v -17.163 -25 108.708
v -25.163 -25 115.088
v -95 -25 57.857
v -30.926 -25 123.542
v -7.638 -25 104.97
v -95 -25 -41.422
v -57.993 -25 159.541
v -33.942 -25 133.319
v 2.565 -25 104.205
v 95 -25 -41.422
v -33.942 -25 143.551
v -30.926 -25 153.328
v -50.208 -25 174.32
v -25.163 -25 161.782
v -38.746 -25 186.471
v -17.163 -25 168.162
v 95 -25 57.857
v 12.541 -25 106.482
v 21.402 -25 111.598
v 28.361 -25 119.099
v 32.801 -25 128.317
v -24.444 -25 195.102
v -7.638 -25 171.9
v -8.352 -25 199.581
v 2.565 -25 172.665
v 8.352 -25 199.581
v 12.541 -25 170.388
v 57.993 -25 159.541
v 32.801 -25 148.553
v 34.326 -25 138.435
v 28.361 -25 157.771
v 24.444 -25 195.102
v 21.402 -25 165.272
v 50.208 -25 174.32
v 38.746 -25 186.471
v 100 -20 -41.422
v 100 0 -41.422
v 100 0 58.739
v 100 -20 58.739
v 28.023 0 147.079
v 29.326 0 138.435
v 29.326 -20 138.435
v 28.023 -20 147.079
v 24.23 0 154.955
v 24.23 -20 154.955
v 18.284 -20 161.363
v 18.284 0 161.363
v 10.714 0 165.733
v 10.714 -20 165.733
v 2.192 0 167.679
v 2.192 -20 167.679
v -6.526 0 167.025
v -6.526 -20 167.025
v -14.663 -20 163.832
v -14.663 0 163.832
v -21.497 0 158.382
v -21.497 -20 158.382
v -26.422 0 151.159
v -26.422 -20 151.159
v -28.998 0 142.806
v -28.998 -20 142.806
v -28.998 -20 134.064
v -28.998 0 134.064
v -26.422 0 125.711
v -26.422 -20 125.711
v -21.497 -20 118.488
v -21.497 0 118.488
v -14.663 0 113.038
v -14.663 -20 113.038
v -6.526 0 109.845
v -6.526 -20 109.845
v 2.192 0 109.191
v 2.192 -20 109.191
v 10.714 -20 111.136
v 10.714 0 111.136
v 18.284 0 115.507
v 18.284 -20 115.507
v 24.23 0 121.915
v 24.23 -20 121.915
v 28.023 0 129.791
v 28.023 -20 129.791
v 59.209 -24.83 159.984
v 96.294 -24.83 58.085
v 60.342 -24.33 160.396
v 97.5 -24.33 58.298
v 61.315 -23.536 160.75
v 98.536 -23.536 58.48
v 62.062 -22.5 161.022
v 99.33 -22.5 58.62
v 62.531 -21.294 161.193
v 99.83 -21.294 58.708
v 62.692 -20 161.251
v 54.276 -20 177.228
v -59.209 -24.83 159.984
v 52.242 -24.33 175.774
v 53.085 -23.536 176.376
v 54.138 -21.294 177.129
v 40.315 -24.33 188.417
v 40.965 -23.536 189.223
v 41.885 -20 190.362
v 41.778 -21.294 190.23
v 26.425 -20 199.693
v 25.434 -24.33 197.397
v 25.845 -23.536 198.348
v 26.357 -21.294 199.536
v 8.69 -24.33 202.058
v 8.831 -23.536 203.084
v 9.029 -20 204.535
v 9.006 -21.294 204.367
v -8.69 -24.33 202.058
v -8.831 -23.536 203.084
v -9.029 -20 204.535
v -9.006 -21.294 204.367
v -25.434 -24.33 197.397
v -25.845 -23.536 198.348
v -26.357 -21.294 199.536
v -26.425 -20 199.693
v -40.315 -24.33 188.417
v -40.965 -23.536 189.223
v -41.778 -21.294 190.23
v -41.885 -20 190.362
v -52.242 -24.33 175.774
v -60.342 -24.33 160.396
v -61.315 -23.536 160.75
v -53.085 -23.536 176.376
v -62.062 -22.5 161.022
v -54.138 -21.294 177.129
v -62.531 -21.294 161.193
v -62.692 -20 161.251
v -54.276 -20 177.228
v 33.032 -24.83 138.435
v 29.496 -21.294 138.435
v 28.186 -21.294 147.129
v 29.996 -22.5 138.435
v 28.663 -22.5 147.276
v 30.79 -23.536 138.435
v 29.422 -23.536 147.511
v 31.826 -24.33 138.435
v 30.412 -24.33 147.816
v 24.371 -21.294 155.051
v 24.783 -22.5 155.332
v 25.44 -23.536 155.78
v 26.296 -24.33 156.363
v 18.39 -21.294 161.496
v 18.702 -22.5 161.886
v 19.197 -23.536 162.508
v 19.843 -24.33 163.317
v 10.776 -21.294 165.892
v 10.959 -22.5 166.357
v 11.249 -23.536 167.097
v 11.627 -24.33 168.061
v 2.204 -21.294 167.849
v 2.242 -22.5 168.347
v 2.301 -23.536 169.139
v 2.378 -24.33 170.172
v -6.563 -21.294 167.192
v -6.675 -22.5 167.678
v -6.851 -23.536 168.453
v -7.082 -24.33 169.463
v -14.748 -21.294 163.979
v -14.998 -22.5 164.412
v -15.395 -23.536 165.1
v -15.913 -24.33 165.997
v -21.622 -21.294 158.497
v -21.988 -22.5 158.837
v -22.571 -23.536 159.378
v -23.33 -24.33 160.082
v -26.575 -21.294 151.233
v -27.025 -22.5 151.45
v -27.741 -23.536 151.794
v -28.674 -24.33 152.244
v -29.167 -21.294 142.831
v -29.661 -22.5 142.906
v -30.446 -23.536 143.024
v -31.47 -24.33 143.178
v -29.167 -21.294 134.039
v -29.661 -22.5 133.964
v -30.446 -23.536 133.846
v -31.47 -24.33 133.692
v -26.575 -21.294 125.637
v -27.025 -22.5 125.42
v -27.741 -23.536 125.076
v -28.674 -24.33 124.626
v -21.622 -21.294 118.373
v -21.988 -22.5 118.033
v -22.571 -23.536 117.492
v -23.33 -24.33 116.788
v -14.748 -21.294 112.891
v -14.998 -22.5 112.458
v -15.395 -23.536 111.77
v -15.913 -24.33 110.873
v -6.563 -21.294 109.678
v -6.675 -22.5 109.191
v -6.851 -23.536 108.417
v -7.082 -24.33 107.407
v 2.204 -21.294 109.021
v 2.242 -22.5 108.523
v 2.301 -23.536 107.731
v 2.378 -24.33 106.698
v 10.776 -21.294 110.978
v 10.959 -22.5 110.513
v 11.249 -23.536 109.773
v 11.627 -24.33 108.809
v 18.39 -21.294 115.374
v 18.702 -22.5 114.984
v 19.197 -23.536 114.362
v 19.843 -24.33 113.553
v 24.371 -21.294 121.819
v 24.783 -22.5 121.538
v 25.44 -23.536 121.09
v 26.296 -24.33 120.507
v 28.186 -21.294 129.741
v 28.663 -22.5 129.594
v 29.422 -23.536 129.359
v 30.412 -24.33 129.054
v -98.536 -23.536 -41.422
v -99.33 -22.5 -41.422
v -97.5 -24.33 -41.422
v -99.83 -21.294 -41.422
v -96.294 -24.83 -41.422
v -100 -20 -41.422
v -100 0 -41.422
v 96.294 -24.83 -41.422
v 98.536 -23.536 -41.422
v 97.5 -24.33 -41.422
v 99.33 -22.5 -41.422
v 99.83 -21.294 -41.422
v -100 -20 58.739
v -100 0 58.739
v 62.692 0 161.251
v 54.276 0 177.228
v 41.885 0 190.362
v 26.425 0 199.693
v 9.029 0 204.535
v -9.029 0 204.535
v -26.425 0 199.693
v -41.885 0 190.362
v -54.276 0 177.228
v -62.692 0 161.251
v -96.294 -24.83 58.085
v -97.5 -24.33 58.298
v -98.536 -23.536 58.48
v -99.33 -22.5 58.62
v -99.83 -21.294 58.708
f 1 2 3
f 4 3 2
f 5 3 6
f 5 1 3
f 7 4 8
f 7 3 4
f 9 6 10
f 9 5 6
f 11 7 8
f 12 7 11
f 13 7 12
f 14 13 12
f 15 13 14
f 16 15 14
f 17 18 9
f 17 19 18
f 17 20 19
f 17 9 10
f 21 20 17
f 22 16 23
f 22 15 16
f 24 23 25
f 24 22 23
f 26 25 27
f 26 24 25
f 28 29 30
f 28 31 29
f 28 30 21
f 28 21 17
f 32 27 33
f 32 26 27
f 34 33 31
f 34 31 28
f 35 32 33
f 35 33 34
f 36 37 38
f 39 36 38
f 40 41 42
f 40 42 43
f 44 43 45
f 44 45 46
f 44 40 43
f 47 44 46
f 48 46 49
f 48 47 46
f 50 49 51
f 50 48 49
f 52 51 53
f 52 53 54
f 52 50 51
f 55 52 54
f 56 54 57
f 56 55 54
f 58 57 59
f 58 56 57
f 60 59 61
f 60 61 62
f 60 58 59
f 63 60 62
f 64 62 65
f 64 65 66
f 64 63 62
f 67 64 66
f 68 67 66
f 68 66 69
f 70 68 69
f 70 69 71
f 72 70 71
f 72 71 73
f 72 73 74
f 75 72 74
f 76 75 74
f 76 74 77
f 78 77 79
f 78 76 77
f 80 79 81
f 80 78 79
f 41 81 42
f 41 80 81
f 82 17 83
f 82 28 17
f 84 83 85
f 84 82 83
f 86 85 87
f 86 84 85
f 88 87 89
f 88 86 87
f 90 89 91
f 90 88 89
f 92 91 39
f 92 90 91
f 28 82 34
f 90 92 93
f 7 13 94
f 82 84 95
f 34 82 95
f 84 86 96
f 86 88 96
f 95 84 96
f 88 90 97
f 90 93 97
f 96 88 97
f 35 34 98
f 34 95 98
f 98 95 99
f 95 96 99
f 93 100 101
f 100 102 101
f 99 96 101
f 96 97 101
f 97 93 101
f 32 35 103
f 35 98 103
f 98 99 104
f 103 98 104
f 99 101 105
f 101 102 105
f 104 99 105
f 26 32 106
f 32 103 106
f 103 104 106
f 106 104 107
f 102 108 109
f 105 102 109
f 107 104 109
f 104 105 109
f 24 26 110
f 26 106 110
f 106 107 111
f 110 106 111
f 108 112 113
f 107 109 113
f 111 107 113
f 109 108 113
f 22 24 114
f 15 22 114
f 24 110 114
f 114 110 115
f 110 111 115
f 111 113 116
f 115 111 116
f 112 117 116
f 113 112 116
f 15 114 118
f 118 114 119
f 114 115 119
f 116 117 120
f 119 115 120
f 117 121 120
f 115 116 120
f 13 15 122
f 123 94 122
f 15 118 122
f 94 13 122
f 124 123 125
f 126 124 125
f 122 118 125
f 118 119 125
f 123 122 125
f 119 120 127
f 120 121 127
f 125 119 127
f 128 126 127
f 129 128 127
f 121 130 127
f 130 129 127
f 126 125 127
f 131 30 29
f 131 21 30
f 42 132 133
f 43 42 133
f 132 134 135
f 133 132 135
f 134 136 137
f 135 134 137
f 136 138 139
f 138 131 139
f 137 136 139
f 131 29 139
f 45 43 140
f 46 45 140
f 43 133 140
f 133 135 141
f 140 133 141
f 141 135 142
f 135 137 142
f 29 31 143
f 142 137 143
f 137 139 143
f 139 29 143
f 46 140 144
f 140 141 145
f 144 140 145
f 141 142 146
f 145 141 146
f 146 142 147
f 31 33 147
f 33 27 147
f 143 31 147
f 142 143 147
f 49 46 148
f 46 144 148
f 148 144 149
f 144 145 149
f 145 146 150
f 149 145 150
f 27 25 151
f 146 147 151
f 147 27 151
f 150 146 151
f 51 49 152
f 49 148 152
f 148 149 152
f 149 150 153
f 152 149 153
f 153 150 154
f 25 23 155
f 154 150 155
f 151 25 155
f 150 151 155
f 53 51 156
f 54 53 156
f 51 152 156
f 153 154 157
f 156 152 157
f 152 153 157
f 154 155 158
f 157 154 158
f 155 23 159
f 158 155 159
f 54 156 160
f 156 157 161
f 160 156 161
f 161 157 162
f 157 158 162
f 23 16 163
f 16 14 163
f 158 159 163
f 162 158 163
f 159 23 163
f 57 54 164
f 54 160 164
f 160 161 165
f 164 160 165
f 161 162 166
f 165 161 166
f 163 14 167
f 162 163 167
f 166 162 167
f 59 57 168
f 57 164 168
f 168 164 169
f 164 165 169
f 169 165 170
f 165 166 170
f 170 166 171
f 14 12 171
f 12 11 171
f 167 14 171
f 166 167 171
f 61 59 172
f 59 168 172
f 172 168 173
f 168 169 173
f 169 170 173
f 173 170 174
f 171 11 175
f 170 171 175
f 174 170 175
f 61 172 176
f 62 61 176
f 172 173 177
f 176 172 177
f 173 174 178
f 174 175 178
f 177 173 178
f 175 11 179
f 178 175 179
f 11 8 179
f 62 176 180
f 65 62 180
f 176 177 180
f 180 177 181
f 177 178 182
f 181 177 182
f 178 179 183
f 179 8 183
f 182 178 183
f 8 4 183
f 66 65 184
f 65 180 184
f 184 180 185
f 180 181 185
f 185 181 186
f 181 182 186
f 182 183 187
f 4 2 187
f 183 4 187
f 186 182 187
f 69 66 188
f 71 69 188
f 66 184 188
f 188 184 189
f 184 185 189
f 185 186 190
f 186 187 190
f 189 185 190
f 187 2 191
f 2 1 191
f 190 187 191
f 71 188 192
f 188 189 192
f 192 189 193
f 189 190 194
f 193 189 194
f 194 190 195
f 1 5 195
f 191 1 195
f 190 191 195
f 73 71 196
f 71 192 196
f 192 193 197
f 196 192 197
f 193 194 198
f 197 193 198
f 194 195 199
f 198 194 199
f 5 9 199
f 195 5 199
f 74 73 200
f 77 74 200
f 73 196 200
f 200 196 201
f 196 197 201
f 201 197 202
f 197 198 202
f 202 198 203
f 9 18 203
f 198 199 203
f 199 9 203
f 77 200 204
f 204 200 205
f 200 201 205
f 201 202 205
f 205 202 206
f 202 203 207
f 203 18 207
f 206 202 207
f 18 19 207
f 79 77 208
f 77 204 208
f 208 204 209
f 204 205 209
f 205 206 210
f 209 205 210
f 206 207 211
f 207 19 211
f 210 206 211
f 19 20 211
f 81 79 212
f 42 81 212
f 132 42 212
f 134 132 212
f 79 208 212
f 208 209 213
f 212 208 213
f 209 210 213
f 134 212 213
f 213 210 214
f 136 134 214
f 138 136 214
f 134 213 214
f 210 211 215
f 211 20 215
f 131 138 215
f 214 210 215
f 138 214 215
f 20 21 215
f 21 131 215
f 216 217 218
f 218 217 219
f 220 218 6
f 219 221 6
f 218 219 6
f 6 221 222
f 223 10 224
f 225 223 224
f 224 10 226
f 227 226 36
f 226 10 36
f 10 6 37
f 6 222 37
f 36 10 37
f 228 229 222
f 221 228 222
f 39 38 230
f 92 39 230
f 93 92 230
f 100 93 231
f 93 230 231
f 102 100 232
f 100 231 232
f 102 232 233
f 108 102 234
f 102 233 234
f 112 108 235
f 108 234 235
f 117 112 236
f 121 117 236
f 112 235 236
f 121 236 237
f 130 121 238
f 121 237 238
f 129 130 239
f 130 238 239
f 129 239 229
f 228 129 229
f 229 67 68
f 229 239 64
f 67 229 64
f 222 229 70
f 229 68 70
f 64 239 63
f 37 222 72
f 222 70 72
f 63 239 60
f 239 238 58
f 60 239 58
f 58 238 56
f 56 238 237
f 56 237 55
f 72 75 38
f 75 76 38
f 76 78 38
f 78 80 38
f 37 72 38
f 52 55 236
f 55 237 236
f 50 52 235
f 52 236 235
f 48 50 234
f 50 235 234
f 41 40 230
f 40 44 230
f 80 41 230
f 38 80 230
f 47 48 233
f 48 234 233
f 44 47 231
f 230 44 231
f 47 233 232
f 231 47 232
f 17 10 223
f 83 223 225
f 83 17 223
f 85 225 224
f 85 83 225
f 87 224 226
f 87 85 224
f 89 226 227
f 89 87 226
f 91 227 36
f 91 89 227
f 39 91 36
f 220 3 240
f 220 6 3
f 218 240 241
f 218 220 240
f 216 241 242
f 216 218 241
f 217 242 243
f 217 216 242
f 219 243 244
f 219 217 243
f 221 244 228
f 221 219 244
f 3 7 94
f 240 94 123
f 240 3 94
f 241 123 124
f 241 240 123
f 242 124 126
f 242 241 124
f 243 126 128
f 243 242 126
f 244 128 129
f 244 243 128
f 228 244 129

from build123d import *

# Parameters (mm, degrees)
F0_R     = 29.325687
F1_DEPTH = 25
F2_R     = 5
F3_R     = 5


with BuildPart() as f1:
    # F0 (on Front) → F1 (new body)
    with BuildSketch(Plane.XZ):
        with BuildLine():
            Line((-100, 58.738521), (-100, -41.422263))
            Line((-100, -41.422263), (100, -41.422263))
            Line((100, -41.422263), (100, 58.738521))
            Line((100, 58.738521), (62.691501, 161.250998))
            ThreePointArc((62.691501, 161.250998), (0, 205.149263), (-62.691501, 161.250998))
            Line((-62.691501, 161.250998), (-100, 58.738521))
        make_face()
        with Locations((0, 138.434987)):
            Circle(F0_R, mode=Mode.SUBTRACT)
    extrude(amount=F1_DEPTH)

    # F2
    f2_edges = [f1.edges().sort_by_distance(p)[0] for p in [
        (-29.325687, -25, 138.434987),
    ]]
    fillet(f2_edges, radius=F2_R)

    # F3
    f3_edges = [f1.edges().sort_by_distance(p)[0] for p in [
        (-100, -25, 8.658129),
        (-81.34575, -25, 109.994759),
        (0, -25, 205.149263),
        (100, -25, 8.658129),
        (81.34575, -25, 109.994759),
    ]]
    fillet(f3_edges, radius=F3_R)


solid = f1.part
